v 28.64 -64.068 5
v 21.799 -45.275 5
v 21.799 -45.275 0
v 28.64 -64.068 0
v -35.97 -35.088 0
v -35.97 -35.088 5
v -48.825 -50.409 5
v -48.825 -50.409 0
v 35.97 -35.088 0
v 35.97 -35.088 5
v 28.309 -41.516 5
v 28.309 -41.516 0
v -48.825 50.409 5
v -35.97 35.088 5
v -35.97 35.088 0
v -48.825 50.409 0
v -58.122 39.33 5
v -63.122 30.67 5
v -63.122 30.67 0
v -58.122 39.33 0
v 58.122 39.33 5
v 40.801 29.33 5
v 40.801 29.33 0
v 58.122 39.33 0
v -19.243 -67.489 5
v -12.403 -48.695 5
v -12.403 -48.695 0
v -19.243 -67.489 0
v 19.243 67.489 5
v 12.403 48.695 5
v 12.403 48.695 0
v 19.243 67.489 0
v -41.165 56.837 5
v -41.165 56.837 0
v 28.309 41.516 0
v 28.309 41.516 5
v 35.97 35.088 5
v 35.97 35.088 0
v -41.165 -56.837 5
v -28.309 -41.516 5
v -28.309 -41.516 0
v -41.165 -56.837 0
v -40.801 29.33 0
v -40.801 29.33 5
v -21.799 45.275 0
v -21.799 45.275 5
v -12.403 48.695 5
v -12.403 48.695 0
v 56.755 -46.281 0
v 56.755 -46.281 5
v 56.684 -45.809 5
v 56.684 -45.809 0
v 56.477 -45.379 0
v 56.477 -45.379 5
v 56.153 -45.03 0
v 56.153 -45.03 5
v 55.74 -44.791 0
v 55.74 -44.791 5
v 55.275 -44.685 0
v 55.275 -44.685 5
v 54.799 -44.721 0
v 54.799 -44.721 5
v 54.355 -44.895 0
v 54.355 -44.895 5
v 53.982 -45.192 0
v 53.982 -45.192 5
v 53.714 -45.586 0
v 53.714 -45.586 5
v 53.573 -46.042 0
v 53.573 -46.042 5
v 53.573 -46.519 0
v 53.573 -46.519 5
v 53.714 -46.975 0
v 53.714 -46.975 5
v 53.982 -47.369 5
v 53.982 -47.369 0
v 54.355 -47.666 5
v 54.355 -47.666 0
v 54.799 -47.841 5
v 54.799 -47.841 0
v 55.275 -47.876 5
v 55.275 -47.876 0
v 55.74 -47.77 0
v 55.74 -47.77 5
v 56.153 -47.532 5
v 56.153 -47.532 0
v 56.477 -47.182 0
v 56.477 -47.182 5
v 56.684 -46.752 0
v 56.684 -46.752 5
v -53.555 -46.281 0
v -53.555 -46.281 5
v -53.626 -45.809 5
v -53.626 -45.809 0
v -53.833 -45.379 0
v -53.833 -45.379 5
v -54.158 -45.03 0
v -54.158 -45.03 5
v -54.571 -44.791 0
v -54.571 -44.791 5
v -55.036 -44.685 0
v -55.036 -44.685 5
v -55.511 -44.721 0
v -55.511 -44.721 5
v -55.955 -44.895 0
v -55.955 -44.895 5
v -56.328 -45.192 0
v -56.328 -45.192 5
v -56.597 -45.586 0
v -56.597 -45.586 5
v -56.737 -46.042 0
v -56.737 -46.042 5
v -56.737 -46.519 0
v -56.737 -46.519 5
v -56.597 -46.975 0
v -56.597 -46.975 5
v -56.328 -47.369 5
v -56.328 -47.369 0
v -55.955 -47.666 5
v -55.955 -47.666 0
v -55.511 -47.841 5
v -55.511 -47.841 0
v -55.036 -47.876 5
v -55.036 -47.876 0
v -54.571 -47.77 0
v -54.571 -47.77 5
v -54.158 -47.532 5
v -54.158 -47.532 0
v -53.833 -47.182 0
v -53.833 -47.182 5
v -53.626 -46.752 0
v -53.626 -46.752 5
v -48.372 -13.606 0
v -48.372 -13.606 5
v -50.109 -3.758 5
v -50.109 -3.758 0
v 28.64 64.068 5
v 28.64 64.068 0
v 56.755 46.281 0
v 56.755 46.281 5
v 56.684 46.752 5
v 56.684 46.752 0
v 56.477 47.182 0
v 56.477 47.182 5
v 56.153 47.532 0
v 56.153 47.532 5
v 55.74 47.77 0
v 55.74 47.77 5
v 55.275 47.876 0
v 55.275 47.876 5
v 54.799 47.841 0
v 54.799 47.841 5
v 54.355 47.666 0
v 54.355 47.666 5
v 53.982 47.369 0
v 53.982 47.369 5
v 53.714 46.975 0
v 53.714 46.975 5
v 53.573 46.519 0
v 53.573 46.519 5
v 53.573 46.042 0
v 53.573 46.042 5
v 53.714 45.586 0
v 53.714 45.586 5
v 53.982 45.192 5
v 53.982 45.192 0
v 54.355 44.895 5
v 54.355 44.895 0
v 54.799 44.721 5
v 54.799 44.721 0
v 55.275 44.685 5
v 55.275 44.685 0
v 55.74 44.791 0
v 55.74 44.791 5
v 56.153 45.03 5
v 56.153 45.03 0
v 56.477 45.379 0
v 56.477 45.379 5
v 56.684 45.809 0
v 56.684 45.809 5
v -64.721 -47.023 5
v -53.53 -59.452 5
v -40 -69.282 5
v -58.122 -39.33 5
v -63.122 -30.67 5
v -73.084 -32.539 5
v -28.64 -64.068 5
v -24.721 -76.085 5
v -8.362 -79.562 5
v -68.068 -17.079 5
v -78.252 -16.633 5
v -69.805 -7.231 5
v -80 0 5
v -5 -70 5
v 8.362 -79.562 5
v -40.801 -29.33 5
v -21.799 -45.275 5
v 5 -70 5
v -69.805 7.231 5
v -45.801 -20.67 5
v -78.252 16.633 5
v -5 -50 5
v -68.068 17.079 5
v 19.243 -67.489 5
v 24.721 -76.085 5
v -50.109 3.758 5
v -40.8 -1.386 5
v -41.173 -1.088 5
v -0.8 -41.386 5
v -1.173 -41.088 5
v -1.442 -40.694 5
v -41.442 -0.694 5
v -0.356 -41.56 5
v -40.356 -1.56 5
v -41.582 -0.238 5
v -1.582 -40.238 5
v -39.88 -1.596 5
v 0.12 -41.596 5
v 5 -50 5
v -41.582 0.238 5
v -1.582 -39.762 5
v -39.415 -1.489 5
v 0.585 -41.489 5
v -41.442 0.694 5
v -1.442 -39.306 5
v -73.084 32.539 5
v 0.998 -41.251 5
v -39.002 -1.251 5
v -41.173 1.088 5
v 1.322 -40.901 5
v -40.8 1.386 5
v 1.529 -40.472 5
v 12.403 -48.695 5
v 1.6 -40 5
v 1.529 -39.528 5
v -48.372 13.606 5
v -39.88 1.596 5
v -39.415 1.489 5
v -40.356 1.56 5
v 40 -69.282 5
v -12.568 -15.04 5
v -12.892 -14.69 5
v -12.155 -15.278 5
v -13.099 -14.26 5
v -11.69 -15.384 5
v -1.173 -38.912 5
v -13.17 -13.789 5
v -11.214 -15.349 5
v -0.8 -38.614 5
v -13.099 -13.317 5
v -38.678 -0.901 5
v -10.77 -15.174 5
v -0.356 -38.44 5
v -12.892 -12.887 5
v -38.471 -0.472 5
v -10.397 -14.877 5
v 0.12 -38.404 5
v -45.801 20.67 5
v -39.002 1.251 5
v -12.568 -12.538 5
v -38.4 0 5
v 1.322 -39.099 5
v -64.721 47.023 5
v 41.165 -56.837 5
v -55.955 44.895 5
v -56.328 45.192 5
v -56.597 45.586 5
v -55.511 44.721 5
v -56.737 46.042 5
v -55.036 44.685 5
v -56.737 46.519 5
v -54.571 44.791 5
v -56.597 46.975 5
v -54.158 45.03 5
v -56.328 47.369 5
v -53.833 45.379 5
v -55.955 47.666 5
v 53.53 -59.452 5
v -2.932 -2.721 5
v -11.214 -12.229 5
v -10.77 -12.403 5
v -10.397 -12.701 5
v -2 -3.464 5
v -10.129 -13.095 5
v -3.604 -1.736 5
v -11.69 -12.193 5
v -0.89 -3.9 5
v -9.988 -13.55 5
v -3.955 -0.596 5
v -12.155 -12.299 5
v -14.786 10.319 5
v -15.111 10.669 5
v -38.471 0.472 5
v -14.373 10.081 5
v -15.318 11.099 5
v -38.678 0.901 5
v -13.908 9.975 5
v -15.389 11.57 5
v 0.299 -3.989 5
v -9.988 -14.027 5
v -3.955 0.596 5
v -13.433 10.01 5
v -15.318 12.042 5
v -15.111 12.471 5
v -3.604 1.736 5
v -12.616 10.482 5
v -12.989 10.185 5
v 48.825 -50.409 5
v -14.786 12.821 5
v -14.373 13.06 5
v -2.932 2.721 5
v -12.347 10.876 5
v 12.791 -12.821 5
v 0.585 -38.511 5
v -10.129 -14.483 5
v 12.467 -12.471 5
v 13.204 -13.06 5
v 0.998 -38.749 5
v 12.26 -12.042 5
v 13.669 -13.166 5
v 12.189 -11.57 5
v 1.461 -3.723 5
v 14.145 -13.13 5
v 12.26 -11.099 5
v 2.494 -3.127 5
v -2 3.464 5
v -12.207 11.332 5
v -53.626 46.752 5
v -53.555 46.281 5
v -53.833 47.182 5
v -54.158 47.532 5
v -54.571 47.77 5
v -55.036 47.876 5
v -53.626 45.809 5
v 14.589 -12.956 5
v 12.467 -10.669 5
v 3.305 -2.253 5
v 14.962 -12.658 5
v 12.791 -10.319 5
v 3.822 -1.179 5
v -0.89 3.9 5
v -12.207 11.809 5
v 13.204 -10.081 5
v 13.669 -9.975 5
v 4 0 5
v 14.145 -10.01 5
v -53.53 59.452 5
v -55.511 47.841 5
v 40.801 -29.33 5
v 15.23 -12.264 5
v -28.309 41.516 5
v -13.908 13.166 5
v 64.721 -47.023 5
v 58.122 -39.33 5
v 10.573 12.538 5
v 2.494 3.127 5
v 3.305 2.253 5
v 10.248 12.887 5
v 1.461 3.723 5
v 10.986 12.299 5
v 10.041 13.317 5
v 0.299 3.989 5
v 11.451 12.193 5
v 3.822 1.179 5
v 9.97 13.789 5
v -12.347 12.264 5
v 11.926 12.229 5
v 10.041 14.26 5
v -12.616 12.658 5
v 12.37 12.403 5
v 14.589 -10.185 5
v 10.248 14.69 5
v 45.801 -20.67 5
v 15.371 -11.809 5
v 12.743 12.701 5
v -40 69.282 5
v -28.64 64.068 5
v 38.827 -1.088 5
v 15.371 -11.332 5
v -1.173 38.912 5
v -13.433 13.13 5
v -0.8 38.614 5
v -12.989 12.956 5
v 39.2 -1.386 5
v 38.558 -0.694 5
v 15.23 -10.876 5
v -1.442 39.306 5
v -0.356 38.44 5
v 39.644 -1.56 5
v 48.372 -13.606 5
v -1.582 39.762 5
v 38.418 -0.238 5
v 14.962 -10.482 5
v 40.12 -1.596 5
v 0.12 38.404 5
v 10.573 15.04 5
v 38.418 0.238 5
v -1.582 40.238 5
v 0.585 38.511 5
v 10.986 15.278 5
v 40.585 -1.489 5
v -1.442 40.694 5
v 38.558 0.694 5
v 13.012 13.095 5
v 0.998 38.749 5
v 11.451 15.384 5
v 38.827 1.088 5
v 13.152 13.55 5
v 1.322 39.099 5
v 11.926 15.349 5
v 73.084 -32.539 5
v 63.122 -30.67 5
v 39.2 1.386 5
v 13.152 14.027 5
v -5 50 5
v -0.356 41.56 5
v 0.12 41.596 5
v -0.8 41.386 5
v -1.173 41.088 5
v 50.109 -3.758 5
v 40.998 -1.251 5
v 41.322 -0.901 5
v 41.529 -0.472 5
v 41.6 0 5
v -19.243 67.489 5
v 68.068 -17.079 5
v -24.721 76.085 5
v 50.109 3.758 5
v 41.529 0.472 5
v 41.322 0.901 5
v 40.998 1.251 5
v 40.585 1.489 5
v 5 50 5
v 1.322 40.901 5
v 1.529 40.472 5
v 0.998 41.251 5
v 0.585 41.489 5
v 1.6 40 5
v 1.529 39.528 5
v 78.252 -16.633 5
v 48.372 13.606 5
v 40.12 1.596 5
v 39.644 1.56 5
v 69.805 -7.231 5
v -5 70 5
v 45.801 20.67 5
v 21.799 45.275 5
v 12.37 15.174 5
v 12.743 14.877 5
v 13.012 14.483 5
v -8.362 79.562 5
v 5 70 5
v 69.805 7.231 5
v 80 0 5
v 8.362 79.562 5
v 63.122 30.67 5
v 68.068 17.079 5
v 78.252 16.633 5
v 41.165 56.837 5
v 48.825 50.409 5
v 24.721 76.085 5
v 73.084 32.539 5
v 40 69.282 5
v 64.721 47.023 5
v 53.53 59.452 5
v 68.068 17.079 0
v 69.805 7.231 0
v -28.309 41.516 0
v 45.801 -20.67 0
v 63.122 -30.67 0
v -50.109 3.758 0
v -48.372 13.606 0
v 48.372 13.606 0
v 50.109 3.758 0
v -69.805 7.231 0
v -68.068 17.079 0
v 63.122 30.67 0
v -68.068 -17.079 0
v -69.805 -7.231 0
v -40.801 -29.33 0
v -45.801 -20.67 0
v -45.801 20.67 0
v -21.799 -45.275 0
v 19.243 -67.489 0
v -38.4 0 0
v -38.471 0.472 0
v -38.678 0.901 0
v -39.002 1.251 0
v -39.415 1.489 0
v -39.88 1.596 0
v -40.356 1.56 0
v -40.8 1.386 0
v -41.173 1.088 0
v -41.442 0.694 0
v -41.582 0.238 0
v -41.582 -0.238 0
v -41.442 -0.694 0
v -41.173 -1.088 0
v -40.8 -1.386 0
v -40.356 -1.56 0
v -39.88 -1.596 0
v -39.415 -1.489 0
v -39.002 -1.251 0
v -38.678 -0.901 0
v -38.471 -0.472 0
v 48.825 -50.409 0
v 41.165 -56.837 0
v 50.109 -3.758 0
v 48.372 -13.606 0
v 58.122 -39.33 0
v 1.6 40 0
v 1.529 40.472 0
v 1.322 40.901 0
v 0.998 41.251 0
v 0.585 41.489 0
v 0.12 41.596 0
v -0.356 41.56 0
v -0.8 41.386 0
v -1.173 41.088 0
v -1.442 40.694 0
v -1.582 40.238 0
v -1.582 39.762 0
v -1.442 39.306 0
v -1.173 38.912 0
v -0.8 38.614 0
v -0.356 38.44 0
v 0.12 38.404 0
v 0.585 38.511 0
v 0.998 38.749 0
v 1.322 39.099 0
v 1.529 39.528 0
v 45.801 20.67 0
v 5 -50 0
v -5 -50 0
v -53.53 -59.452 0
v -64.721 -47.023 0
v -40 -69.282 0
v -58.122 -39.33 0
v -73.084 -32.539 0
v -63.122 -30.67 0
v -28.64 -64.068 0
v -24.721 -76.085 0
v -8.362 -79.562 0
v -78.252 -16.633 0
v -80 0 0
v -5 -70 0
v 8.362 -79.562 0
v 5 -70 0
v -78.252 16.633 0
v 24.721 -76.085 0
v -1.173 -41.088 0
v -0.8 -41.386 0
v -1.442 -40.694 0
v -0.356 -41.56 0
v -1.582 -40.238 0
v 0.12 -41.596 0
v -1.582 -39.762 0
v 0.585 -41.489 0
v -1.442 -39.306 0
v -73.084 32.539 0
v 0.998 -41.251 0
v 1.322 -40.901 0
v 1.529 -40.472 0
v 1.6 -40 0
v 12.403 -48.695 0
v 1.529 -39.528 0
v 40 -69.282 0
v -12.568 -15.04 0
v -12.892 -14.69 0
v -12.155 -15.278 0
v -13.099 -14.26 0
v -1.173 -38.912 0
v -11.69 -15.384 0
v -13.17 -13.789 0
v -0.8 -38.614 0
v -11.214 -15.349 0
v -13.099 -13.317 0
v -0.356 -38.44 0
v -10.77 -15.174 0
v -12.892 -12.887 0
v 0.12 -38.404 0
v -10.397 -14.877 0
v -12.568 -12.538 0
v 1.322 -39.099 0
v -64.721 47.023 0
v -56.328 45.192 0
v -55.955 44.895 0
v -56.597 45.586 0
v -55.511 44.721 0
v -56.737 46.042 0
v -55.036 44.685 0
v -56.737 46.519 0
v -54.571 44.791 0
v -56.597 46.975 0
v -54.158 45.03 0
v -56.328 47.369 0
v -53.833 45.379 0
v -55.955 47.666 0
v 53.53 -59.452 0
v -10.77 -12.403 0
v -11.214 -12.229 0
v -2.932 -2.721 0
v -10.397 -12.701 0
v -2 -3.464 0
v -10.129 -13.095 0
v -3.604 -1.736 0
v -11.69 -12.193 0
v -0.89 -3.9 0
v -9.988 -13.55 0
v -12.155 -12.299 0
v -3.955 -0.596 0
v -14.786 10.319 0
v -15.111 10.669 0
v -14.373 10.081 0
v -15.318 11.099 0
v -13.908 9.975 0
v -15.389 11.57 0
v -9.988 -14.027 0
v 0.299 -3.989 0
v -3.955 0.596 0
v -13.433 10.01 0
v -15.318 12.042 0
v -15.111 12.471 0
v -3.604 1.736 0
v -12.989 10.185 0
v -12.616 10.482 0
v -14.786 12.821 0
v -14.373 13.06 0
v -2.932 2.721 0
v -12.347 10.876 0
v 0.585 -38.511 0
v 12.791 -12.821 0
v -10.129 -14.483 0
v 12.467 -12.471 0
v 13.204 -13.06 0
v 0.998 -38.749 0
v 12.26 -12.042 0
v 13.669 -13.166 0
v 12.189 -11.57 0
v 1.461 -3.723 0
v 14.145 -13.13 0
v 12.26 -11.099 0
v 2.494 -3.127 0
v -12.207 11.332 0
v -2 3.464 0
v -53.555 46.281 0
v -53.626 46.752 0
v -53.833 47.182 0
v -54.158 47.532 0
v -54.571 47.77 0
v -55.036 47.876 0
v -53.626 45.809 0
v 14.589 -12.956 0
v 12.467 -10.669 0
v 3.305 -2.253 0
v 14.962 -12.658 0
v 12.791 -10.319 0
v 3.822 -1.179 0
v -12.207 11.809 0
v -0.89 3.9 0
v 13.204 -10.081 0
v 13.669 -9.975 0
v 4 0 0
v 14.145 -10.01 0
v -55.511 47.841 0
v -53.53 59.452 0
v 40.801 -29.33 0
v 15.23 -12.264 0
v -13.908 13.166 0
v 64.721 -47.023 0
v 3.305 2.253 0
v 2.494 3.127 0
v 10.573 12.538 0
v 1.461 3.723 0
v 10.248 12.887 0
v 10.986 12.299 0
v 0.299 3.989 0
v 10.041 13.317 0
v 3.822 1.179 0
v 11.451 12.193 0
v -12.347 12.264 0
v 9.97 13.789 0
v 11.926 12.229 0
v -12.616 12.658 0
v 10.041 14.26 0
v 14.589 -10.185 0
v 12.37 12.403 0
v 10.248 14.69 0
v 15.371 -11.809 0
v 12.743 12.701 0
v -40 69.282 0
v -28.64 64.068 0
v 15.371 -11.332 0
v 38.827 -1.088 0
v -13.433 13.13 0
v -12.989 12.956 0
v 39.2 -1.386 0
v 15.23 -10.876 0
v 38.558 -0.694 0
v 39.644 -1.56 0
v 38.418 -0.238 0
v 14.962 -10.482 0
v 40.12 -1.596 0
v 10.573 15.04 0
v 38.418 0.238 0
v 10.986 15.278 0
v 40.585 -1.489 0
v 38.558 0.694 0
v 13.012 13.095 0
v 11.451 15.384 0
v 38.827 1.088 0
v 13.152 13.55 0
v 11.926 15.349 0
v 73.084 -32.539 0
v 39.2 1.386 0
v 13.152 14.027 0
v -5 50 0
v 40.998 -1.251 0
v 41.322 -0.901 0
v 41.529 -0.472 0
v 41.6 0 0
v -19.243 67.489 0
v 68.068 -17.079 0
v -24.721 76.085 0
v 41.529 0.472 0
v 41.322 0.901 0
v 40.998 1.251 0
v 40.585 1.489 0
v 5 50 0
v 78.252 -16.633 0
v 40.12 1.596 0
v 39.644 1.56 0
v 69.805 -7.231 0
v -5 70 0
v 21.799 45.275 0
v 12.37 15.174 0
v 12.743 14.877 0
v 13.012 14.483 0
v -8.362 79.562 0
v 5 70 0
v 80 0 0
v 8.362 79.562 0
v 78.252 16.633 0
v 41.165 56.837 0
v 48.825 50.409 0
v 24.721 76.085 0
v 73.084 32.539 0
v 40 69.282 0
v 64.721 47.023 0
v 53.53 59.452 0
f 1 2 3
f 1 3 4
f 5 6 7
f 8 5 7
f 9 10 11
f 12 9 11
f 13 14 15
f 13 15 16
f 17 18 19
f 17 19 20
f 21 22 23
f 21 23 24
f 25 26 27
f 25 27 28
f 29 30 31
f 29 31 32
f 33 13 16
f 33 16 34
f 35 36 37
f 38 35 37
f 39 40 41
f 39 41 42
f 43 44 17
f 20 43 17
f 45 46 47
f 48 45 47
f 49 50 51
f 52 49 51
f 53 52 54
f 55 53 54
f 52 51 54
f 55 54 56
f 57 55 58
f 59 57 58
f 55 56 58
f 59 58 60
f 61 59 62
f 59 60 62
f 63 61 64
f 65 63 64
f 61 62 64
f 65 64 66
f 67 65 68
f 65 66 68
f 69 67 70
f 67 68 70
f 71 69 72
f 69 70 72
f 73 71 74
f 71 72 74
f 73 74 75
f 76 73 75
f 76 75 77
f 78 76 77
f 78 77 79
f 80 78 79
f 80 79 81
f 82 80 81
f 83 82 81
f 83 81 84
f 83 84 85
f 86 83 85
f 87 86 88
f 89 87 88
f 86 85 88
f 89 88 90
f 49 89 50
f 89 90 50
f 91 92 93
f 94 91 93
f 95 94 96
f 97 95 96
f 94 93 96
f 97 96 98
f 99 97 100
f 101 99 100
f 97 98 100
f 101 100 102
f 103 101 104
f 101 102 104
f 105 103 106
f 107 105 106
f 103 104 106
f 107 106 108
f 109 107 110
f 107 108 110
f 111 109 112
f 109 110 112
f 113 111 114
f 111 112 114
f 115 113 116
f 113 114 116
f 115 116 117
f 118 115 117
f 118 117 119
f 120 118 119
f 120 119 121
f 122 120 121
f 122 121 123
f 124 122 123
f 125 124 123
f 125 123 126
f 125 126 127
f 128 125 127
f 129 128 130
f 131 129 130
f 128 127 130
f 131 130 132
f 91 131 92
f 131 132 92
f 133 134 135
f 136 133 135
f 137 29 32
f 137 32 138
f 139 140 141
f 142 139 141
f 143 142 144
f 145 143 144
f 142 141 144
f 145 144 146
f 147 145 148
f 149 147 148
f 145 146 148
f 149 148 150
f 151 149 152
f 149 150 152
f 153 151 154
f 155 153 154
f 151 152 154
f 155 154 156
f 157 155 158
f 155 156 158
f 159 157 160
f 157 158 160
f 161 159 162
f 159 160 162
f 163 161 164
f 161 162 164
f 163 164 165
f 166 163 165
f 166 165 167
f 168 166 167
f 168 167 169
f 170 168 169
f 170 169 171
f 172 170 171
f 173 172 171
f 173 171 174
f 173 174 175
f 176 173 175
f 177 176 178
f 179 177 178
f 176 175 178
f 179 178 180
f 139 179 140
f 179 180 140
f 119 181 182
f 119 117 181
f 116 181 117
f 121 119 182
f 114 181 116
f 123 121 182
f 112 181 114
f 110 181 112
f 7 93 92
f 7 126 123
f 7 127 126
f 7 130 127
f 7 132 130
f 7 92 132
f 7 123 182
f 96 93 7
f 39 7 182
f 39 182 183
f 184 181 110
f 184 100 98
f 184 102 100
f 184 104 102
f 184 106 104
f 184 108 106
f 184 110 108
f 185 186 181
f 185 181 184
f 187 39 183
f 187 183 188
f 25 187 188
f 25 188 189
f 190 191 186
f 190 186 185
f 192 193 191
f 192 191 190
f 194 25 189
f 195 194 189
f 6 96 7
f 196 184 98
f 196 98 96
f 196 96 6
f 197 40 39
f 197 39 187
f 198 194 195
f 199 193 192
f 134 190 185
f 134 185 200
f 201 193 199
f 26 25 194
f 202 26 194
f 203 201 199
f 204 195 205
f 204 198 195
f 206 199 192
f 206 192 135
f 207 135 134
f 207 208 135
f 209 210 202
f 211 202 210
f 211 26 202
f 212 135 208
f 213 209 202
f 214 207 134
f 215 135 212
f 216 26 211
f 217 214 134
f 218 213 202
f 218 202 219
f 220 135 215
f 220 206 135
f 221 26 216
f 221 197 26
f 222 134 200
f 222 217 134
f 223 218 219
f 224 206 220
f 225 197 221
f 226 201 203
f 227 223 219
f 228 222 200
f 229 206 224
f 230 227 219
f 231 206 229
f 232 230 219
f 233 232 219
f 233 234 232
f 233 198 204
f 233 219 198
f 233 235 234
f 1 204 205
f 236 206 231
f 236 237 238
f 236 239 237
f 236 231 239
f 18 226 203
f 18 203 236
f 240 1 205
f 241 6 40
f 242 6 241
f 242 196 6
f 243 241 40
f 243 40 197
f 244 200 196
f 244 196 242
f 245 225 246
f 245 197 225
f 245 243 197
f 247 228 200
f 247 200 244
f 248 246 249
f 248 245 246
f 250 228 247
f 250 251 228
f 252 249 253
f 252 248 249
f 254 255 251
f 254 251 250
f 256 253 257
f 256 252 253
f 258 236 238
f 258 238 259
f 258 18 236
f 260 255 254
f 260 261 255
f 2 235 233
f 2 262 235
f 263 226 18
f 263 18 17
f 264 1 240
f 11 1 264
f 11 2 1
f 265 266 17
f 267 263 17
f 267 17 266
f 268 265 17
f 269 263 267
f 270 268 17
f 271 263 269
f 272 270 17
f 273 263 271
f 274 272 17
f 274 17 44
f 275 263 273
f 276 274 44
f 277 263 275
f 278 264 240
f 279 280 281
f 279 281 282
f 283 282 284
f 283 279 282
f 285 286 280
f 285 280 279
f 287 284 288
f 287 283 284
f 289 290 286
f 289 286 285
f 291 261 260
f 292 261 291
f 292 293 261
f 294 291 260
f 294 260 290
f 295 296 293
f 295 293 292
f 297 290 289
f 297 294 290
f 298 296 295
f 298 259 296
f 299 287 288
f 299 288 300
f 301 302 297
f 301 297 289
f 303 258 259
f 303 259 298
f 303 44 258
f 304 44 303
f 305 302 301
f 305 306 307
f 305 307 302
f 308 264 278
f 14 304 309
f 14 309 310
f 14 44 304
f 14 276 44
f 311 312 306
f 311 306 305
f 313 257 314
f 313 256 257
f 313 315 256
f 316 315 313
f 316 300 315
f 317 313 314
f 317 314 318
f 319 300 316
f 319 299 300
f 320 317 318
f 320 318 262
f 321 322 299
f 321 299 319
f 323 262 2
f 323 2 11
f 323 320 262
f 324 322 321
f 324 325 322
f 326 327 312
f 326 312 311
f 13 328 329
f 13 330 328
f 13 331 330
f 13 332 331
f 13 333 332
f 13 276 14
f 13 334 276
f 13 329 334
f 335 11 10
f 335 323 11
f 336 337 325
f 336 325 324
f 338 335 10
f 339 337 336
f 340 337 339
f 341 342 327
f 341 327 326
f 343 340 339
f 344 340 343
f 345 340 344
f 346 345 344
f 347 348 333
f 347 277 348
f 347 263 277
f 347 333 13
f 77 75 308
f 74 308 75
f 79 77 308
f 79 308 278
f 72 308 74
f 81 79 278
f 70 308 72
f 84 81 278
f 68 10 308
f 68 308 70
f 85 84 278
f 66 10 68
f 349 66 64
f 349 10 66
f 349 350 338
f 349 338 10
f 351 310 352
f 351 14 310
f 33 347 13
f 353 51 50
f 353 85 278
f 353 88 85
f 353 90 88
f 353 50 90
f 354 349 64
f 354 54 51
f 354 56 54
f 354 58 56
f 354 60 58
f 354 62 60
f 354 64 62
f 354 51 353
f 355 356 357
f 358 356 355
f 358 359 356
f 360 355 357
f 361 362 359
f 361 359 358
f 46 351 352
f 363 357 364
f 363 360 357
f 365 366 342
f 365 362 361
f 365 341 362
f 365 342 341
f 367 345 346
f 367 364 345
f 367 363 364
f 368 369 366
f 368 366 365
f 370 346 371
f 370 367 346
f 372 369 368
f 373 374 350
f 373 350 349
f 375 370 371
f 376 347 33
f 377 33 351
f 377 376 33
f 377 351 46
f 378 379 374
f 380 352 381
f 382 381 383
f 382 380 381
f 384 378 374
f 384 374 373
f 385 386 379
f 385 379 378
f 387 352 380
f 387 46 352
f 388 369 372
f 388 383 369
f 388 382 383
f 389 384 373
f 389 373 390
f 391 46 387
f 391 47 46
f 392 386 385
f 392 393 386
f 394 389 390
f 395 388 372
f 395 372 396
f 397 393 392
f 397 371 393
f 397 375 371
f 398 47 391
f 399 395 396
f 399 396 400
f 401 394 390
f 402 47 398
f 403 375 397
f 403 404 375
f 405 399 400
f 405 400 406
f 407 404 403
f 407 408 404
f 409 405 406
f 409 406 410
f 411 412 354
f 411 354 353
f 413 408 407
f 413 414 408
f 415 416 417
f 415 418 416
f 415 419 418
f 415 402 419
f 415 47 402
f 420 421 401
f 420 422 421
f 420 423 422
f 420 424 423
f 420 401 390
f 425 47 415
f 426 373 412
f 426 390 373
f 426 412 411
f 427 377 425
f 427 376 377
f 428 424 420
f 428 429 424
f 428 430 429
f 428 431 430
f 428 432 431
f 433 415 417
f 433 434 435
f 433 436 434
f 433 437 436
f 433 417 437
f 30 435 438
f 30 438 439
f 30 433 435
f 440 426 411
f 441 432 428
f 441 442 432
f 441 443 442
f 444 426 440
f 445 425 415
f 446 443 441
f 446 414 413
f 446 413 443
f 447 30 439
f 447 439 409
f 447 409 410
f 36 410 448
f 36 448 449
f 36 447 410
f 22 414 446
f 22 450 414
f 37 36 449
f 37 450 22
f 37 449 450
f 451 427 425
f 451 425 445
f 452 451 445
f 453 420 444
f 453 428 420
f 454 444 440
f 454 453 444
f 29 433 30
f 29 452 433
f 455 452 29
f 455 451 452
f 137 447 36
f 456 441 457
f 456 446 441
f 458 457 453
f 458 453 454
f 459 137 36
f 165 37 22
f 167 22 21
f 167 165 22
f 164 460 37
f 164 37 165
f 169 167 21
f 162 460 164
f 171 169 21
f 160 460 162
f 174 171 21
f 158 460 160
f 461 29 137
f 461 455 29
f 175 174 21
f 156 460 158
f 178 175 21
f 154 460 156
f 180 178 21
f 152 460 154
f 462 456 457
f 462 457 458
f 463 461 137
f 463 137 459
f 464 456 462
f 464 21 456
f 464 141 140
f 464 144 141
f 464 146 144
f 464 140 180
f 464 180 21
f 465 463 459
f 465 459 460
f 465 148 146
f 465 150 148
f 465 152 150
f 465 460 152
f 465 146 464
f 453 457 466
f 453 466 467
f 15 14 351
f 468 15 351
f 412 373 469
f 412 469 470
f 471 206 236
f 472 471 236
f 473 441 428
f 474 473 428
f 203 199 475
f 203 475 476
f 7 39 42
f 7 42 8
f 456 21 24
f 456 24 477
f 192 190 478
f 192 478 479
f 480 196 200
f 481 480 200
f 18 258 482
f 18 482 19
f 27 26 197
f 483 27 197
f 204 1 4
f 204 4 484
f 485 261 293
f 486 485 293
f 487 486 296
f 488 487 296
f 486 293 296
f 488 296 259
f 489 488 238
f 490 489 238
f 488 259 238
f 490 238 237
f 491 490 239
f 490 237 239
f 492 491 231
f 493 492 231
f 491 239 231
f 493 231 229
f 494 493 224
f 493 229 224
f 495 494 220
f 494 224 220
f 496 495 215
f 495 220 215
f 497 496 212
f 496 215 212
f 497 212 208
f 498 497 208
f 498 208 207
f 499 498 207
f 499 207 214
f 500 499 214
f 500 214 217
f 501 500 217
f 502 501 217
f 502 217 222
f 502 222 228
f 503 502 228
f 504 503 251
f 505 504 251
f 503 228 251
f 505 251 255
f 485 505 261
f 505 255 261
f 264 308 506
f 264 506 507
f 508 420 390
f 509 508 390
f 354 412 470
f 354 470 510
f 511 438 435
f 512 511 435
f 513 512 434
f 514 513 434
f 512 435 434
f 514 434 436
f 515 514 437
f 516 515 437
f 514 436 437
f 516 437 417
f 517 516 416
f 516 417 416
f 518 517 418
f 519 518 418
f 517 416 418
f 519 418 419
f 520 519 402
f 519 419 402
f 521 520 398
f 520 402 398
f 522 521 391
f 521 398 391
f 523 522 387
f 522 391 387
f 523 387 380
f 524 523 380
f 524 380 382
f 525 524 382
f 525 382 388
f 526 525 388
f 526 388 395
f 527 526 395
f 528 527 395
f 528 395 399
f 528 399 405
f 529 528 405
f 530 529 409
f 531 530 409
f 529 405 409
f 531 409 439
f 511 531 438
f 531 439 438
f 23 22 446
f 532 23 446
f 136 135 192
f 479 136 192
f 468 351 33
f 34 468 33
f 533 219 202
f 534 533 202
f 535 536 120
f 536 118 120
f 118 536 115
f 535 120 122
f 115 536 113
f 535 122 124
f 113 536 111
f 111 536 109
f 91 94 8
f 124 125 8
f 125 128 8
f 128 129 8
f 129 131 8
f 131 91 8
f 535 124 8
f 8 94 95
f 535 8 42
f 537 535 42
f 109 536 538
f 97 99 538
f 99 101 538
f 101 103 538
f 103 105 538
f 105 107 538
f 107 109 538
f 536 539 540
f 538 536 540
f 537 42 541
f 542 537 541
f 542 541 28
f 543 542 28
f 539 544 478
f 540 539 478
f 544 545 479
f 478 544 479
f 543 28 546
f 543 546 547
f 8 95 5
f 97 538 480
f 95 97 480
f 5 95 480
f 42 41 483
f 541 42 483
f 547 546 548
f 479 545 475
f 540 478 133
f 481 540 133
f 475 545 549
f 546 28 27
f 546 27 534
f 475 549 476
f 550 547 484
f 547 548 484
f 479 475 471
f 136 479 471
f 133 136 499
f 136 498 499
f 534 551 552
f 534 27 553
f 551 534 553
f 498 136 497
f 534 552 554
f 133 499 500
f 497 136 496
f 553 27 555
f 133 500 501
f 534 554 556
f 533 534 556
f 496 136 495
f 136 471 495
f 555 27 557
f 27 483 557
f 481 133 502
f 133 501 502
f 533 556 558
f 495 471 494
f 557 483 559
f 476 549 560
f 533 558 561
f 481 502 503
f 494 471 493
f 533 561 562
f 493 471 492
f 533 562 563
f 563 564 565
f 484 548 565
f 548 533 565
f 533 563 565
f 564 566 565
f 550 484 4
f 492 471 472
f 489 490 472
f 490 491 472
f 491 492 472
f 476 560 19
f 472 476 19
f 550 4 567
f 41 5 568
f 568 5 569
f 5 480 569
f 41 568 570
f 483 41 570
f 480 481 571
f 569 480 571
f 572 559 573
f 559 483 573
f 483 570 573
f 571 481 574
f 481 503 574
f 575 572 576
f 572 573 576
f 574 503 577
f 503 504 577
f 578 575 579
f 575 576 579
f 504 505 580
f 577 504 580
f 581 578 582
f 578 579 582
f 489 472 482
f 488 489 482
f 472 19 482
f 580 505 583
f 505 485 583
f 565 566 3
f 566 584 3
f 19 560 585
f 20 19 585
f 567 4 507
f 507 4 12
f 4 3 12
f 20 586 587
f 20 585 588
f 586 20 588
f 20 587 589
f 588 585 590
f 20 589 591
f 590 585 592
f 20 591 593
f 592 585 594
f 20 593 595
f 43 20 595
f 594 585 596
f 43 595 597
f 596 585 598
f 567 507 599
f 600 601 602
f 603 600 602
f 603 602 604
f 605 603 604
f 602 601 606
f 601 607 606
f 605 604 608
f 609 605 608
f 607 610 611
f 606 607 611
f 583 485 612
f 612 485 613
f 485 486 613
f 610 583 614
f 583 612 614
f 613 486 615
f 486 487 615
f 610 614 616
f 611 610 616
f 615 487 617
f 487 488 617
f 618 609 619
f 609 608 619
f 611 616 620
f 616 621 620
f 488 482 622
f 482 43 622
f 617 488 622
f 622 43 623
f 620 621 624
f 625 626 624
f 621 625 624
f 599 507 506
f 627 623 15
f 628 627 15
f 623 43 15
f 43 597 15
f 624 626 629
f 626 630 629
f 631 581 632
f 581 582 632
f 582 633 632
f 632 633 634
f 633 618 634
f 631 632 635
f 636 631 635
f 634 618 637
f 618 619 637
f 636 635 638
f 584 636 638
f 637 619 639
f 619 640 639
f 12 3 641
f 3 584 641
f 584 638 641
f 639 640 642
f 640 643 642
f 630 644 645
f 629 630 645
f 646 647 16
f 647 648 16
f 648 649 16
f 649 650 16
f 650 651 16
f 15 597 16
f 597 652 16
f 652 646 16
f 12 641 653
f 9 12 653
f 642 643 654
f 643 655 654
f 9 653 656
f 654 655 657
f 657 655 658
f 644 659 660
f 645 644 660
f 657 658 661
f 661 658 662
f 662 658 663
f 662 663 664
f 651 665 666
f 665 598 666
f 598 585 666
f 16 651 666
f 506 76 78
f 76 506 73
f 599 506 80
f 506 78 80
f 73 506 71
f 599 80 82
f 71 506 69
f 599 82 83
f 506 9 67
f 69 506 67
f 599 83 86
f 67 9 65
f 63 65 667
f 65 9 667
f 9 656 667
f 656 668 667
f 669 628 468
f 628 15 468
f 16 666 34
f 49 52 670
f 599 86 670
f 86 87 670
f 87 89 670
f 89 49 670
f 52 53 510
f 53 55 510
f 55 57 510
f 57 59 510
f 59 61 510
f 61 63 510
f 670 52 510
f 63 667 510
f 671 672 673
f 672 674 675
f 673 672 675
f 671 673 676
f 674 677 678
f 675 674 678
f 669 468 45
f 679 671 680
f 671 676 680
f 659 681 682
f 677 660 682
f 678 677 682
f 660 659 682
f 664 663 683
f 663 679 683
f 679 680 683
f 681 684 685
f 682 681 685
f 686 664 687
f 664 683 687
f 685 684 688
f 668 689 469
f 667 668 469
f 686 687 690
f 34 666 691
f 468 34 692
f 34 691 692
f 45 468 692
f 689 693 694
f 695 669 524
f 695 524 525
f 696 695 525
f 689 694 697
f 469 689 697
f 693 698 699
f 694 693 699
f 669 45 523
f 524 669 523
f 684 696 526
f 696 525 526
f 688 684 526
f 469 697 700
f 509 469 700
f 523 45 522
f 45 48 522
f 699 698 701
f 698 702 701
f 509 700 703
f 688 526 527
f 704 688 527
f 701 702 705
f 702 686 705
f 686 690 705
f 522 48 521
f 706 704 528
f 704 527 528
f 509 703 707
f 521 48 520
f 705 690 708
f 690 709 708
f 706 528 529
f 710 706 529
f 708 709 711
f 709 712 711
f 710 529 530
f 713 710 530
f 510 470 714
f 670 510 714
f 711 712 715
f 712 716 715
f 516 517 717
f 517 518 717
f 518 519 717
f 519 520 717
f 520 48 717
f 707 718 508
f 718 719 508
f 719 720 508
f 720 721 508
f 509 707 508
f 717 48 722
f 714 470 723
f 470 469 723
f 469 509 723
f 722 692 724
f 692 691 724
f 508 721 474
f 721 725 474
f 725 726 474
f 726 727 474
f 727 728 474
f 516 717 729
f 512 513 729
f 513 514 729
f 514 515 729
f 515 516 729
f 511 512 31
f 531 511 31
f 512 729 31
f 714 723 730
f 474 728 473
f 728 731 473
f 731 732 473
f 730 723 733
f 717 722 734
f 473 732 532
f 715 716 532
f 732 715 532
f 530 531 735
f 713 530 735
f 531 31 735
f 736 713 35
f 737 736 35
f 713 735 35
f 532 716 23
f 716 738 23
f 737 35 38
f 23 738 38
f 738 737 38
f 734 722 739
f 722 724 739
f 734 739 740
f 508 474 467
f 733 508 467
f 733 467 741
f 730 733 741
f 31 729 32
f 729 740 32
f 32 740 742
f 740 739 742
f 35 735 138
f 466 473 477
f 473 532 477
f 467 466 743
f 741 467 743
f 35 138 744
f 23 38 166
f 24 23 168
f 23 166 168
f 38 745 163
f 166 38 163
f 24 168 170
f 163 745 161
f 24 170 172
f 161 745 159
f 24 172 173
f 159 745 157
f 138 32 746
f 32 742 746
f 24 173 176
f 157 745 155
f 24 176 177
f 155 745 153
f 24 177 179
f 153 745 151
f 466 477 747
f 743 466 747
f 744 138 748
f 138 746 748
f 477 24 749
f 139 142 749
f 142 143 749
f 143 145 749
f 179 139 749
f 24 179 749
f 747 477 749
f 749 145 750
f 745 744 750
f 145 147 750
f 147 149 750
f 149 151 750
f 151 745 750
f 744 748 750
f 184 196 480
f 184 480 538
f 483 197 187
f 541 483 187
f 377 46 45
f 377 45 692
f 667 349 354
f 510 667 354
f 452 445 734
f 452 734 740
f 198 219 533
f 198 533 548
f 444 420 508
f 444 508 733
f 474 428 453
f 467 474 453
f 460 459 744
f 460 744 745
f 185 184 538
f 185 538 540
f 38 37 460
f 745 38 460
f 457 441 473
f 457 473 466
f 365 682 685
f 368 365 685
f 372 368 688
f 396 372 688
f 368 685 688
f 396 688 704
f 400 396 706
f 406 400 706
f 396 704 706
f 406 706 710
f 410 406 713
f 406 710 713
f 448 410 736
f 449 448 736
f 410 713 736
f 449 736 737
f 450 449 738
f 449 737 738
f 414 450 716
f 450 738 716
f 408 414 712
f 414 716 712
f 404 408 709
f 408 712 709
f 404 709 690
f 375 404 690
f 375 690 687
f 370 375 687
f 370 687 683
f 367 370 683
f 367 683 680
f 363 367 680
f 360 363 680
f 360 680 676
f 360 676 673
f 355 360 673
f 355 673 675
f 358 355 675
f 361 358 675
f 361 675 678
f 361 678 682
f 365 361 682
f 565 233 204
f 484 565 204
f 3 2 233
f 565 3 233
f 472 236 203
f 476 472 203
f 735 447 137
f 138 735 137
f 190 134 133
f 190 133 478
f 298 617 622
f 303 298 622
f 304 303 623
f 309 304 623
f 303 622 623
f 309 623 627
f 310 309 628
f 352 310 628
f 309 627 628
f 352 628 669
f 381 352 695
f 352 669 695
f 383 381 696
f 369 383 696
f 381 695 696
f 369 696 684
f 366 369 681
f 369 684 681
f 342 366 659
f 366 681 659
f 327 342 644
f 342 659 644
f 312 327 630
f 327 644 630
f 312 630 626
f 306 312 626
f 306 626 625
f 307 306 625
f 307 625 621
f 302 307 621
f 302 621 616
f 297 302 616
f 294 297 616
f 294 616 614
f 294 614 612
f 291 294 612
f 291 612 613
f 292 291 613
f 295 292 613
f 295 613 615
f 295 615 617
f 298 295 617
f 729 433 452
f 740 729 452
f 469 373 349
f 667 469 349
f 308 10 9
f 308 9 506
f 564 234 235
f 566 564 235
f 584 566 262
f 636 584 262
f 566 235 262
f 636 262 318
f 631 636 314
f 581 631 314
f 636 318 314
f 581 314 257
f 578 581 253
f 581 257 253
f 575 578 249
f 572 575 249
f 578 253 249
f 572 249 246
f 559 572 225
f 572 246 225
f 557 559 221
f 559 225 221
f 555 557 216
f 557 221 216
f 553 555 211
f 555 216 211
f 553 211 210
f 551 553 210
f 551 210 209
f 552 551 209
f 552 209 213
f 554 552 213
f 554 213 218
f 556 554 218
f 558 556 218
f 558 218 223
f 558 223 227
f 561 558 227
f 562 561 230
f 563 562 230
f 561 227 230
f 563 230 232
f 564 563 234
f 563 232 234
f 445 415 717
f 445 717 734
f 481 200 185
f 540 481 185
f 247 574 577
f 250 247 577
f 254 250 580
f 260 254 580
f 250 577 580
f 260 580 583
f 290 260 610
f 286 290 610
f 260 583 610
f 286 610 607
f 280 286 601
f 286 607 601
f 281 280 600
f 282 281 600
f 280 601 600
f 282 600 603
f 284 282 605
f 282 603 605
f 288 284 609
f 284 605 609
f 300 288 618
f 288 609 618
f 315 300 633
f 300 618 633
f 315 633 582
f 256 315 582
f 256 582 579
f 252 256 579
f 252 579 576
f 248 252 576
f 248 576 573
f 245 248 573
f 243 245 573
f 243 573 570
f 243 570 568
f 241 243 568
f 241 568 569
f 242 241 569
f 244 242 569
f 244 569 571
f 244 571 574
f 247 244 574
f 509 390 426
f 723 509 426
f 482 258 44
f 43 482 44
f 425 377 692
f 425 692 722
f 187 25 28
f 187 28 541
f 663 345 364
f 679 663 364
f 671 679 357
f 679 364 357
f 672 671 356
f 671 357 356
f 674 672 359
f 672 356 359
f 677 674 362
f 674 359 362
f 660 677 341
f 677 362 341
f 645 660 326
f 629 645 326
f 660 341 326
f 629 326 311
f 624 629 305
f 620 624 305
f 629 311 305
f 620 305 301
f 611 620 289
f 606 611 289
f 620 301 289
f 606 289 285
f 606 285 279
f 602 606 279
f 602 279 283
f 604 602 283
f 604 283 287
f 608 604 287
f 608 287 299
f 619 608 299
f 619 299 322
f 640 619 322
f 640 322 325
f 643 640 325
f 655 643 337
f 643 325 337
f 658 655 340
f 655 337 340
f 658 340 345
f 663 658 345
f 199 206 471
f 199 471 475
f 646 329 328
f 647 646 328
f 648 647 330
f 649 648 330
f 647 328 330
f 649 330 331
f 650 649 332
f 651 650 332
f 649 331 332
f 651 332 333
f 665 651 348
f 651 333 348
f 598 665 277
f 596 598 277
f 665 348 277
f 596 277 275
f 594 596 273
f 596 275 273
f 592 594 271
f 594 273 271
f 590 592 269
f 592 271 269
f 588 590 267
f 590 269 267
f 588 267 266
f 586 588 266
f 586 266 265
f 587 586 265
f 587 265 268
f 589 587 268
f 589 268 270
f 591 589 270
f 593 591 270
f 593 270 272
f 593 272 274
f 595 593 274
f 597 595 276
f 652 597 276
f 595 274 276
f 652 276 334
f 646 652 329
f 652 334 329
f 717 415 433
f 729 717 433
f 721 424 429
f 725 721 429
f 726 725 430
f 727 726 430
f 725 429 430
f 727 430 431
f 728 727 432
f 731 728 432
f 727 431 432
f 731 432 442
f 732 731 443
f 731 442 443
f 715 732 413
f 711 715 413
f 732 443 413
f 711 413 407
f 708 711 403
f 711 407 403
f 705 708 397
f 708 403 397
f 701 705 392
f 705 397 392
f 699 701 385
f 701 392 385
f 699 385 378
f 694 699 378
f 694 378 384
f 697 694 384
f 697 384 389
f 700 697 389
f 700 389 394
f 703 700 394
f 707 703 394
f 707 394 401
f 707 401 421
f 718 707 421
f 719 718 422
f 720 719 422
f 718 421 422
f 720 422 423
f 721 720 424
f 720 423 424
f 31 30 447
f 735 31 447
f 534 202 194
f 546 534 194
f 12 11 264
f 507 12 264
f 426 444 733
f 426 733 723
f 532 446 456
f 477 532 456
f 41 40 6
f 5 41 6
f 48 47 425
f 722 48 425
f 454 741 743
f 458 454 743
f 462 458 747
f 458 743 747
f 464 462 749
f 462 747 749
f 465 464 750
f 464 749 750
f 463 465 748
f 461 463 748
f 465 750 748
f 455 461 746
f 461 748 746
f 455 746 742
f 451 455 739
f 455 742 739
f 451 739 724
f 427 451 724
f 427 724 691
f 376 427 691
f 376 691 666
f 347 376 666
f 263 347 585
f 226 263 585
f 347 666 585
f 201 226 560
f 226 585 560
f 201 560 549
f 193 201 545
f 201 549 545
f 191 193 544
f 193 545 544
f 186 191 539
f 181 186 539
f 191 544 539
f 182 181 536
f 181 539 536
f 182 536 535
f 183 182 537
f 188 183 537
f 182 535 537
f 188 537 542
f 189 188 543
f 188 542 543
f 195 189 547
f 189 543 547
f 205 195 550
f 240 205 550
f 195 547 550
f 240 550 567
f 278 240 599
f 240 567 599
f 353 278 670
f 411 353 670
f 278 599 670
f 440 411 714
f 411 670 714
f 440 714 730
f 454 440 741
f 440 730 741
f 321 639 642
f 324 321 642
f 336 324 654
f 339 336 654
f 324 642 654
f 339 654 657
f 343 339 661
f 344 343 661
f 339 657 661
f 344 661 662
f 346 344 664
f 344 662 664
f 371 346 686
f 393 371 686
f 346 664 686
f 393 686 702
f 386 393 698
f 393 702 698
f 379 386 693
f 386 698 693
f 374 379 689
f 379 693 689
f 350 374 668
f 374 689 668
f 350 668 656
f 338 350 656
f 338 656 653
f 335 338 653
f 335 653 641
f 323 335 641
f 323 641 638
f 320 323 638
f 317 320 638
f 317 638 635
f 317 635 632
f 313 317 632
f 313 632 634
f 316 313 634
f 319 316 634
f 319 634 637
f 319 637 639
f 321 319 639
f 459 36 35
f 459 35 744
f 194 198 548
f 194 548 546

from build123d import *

# Parameters (mm, degrees)
SKETCH1_R           = 80
BOSS_EXTRUDE1_DEPTH = 5
SKETCH2_R           = 4
SKETCH2_W           = 10
SKETCH2_H           = 20
CUT_EXTRUDE1_DEPTH  = 5
CIRPATTERN1_COUNT   = 18
SKETCH3_R           = 1.6
CUT_EXTRUDE2_DEPTH  = 5
SKETCH4_R           = 1.6
CUT_EXTRUDE3_DEPTH  = 10


with BuildPart() as part:
    # Sketch1 → Boss-Extrude1 (new body)
    with BuildSketch(Plane.XY):
        Circle(SKETCH1_R)
    extrude(amount=BOSS_EXTRUDE1_DEPTH)

    # Sketch2 → Cut-Extrude1 (cut)
    with BuildSketch(Plane.XY.offset(5)):
        Circle(SKETCH2_R)
        with Locations((0, 60)):
            Rectangle(SKETCH2_W, SKETCH2_H)
    cut_extrude1 = extrude(amount=-CUT_EXTRUDE1_DEPTH, mode=Mode.SUBTRACT)

    # CirPattern1: Cut-Extrude1 ×18 about axis
    cirpattern1_axis = Axis((0, 0, 0), (0, 0, 1))
    for i in range(1, CIRPATTERN1_COUNT):
        add(cut_extrude1.rotate(cirpattern1_axis, i * 360 / CIRPATTERN1_COUNT), mode=Mode.SUBTRACT)

    # Sketch3 → Cut-Extrude2 (cut)
    with BuildSketch(Plane.XY.offset(5)):
        with Locations((-55.155199905, 46.280707897)):
            Circle(SKETCH3_R)
        with Locations((-55.155199905, -46.280707897)):
            Circle(SKETCH3_R)
        with Locations((55.155199905, -46.280707897)):
            Circle(SKETCH3_R)
        with Locations((55.155199905, 46.280707897)):
            Circle(SKETCH3_R)
        with Locations((-40, 0)):
            Circle(SKETCH3_R)
        with Locations((0, 40)):
            Circle(SKETCH3_R)
        with Locations((0, -40)):
            Circle(SKETCH3_R)
        with Locations((40, 0)):
            Circle(SKETCH3_R)
    extrude(amount=-CUT_EXTRUDE2_DEPTH, mode=Mode.SUBTRACT)

    # Sketch4 → Cut-Extrude3 (cut)
    with BuildSketch(Plane(origin=(0, 0, 0), x_dir=(-1, 0, 0), z_dir=(0, 0, -1))):
        with Locations((-11.570176974, 13.788799976)):
            Circle(SKETCH4_R)
        with Locations((13.788799976, 11.570176974)):
            Circle(SKETCH4_R)
        with Locations((11.570176974, -13.788799976)):
            Circle(SKETCH4_R)
        with Locations((-13.788799976, -11.570176974)):
            Circle(SKETCH4_R)
    extrude(amount=-CUT_EXTRUDE3_DEPTH, mode=Mode.SUBTRACT)


solid = part.part
